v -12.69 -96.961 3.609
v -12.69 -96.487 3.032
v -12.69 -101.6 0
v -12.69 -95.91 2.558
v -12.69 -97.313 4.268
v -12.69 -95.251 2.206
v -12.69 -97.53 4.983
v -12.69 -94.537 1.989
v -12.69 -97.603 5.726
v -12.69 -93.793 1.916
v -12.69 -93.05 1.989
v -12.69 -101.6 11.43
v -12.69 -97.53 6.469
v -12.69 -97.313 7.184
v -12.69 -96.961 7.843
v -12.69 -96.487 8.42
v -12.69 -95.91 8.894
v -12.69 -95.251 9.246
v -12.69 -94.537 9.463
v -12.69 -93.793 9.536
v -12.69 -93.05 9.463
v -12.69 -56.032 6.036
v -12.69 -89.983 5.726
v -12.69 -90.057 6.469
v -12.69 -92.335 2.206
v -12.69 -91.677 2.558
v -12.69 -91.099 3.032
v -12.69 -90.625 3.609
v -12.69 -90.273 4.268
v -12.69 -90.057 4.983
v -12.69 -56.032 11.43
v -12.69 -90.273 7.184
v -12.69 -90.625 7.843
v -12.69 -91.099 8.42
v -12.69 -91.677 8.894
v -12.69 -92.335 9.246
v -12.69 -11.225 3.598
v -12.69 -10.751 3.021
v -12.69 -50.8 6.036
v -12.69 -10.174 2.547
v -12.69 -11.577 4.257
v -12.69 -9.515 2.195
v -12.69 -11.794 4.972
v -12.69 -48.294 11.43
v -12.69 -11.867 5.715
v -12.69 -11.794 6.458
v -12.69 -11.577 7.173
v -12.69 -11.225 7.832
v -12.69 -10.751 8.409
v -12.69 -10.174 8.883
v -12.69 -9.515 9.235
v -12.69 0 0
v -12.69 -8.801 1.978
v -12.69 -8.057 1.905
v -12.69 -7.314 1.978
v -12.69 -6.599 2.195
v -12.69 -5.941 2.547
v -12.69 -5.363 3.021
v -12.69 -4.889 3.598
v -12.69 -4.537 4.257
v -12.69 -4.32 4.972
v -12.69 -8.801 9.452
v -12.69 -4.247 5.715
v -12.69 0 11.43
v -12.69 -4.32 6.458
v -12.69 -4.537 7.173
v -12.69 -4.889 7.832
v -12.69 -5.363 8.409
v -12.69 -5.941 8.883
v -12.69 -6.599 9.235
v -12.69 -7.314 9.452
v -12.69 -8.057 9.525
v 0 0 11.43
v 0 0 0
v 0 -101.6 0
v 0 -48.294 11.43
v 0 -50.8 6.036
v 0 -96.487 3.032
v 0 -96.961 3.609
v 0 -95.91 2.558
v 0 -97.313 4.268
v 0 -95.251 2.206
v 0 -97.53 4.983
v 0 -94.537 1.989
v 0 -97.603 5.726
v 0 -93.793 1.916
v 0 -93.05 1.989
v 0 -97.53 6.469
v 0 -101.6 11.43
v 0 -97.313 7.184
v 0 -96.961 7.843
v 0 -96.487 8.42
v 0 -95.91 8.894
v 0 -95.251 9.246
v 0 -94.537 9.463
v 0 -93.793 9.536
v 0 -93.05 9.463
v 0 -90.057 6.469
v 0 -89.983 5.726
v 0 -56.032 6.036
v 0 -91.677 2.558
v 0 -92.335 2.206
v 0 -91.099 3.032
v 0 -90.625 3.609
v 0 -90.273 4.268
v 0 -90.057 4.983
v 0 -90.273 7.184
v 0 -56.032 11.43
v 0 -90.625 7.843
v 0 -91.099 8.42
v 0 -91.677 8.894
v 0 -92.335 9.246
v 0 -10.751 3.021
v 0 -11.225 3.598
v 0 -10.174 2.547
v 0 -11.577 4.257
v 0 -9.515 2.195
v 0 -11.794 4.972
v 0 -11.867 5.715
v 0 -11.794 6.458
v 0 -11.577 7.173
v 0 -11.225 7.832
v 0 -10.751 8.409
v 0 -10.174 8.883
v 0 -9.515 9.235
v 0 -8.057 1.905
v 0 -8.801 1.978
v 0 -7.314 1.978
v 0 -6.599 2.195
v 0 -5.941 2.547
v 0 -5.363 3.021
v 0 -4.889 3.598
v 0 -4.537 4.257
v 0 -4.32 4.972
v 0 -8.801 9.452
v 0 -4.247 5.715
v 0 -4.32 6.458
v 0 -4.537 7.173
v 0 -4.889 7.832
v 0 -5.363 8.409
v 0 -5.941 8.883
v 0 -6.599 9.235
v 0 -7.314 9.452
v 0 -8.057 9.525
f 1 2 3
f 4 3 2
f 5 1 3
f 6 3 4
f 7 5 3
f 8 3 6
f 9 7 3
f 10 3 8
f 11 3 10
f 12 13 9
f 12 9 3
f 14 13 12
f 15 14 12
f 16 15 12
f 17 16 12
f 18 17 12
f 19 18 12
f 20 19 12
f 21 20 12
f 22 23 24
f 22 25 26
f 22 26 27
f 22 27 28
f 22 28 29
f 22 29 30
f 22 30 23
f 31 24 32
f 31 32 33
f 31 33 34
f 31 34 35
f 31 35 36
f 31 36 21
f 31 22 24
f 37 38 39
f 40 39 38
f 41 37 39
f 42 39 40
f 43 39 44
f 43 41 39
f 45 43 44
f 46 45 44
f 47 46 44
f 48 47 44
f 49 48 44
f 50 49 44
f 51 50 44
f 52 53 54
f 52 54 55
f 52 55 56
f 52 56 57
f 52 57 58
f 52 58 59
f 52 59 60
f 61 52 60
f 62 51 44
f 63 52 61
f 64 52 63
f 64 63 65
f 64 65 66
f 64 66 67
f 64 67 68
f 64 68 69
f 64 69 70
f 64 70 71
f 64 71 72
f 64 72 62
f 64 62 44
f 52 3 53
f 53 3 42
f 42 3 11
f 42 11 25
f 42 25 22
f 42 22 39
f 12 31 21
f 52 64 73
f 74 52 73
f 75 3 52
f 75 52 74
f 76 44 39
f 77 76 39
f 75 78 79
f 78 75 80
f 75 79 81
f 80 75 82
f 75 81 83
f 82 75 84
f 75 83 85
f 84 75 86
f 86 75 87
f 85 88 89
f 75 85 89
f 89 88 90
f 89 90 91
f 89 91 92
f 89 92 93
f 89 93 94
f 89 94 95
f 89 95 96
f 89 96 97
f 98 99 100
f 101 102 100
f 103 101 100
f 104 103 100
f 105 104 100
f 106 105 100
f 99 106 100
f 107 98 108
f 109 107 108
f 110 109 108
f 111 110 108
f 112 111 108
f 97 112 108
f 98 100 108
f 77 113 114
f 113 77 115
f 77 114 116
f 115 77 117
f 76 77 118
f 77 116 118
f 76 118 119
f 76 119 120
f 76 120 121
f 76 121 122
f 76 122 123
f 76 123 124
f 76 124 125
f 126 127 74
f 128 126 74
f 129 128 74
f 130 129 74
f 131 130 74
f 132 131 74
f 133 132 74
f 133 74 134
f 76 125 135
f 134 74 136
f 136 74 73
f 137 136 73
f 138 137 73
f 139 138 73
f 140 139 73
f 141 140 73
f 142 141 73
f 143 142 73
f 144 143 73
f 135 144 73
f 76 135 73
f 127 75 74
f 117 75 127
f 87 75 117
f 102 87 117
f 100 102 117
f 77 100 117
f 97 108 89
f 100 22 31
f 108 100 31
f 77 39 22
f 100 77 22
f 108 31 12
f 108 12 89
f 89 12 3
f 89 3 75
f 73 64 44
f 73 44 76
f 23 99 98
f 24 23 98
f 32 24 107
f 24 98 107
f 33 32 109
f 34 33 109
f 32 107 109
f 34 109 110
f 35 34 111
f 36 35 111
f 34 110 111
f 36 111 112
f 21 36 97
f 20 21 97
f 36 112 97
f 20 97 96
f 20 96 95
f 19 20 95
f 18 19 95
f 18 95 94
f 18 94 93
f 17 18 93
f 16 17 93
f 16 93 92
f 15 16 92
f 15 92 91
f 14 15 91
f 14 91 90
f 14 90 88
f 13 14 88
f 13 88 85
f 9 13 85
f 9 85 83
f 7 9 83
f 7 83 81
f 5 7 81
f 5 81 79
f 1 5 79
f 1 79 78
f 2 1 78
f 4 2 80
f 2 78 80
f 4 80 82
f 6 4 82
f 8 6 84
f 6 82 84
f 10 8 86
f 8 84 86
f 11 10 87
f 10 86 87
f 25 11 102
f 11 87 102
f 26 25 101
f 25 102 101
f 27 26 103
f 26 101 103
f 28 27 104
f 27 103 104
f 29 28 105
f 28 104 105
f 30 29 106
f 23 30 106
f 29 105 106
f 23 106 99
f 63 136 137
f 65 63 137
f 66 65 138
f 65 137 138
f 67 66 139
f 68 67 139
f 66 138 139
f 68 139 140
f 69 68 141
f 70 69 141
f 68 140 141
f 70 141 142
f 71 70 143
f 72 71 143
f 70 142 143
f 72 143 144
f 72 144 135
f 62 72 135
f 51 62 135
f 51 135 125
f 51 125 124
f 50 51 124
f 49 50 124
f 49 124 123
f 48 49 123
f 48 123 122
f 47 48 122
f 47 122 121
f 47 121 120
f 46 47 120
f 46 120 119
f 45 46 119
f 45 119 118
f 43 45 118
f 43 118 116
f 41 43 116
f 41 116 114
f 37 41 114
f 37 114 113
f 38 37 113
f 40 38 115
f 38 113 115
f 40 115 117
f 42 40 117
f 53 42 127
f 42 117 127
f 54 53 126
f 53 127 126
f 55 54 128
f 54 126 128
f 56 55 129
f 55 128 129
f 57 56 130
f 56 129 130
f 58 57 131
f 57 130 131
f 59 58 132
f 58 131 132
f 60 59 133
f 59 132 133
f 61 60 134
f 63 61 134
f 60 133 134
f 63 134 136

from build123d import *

# Parameters (mm, degrees)
F0_W     = 12.690173
F0_H     = 11.43
F1_DEPTH = 101.6
F3_DEPTH = 25.4
F6_D     = 7.62
F6_DEPTH = 19.05
F7_D     = 7.62
F7_DEPTH = 19.05


with BuildPart() as f1:
    # F0 (on Front) → F1 (new body)
    with BuildSketch(Plane.XZ):
        with Locations((-6.345086, 5.715)):
            Rectangle(F0_W, F0_H)
    extrude(amount=F1_DEPTH)

    # F2 (on face) → F3 (cut)
    with BuildSketch(Plane(origin=(-12.690173, 0, 0), x_dir=(0, -1, 0), z_dir=(-1, 0, 0))):
        Polygon((50.8, 11.43), (48.294391, 11.43), (50.8, 6.035571), (56.032304, 6.035571), (56.032304, 11.43), align=None)
    extrude(amount=-F3_DEPTH, mode=Mode.SUBTRACT)

    # F6
    with Locations(Plane(origin=(-12.690173, 0, 0), x_dir=(0, -1, 0), z_dir=(-1, 0, 0))):
        with Locations((8.057253, 5.715)):
            Hole(F6_D / 2, depth=F6_DEPTH)

    # F7
    with Locations(Plane(origin=(-12.690173, 0, 0), x_dir=(0, -1, 0), z_dir=(-1, 0, 0))):
        with Locations((93.793303, 5.726054)):
            Hole(F7_D / 2, depth=F7_DEPTH)


solid = f1.part
